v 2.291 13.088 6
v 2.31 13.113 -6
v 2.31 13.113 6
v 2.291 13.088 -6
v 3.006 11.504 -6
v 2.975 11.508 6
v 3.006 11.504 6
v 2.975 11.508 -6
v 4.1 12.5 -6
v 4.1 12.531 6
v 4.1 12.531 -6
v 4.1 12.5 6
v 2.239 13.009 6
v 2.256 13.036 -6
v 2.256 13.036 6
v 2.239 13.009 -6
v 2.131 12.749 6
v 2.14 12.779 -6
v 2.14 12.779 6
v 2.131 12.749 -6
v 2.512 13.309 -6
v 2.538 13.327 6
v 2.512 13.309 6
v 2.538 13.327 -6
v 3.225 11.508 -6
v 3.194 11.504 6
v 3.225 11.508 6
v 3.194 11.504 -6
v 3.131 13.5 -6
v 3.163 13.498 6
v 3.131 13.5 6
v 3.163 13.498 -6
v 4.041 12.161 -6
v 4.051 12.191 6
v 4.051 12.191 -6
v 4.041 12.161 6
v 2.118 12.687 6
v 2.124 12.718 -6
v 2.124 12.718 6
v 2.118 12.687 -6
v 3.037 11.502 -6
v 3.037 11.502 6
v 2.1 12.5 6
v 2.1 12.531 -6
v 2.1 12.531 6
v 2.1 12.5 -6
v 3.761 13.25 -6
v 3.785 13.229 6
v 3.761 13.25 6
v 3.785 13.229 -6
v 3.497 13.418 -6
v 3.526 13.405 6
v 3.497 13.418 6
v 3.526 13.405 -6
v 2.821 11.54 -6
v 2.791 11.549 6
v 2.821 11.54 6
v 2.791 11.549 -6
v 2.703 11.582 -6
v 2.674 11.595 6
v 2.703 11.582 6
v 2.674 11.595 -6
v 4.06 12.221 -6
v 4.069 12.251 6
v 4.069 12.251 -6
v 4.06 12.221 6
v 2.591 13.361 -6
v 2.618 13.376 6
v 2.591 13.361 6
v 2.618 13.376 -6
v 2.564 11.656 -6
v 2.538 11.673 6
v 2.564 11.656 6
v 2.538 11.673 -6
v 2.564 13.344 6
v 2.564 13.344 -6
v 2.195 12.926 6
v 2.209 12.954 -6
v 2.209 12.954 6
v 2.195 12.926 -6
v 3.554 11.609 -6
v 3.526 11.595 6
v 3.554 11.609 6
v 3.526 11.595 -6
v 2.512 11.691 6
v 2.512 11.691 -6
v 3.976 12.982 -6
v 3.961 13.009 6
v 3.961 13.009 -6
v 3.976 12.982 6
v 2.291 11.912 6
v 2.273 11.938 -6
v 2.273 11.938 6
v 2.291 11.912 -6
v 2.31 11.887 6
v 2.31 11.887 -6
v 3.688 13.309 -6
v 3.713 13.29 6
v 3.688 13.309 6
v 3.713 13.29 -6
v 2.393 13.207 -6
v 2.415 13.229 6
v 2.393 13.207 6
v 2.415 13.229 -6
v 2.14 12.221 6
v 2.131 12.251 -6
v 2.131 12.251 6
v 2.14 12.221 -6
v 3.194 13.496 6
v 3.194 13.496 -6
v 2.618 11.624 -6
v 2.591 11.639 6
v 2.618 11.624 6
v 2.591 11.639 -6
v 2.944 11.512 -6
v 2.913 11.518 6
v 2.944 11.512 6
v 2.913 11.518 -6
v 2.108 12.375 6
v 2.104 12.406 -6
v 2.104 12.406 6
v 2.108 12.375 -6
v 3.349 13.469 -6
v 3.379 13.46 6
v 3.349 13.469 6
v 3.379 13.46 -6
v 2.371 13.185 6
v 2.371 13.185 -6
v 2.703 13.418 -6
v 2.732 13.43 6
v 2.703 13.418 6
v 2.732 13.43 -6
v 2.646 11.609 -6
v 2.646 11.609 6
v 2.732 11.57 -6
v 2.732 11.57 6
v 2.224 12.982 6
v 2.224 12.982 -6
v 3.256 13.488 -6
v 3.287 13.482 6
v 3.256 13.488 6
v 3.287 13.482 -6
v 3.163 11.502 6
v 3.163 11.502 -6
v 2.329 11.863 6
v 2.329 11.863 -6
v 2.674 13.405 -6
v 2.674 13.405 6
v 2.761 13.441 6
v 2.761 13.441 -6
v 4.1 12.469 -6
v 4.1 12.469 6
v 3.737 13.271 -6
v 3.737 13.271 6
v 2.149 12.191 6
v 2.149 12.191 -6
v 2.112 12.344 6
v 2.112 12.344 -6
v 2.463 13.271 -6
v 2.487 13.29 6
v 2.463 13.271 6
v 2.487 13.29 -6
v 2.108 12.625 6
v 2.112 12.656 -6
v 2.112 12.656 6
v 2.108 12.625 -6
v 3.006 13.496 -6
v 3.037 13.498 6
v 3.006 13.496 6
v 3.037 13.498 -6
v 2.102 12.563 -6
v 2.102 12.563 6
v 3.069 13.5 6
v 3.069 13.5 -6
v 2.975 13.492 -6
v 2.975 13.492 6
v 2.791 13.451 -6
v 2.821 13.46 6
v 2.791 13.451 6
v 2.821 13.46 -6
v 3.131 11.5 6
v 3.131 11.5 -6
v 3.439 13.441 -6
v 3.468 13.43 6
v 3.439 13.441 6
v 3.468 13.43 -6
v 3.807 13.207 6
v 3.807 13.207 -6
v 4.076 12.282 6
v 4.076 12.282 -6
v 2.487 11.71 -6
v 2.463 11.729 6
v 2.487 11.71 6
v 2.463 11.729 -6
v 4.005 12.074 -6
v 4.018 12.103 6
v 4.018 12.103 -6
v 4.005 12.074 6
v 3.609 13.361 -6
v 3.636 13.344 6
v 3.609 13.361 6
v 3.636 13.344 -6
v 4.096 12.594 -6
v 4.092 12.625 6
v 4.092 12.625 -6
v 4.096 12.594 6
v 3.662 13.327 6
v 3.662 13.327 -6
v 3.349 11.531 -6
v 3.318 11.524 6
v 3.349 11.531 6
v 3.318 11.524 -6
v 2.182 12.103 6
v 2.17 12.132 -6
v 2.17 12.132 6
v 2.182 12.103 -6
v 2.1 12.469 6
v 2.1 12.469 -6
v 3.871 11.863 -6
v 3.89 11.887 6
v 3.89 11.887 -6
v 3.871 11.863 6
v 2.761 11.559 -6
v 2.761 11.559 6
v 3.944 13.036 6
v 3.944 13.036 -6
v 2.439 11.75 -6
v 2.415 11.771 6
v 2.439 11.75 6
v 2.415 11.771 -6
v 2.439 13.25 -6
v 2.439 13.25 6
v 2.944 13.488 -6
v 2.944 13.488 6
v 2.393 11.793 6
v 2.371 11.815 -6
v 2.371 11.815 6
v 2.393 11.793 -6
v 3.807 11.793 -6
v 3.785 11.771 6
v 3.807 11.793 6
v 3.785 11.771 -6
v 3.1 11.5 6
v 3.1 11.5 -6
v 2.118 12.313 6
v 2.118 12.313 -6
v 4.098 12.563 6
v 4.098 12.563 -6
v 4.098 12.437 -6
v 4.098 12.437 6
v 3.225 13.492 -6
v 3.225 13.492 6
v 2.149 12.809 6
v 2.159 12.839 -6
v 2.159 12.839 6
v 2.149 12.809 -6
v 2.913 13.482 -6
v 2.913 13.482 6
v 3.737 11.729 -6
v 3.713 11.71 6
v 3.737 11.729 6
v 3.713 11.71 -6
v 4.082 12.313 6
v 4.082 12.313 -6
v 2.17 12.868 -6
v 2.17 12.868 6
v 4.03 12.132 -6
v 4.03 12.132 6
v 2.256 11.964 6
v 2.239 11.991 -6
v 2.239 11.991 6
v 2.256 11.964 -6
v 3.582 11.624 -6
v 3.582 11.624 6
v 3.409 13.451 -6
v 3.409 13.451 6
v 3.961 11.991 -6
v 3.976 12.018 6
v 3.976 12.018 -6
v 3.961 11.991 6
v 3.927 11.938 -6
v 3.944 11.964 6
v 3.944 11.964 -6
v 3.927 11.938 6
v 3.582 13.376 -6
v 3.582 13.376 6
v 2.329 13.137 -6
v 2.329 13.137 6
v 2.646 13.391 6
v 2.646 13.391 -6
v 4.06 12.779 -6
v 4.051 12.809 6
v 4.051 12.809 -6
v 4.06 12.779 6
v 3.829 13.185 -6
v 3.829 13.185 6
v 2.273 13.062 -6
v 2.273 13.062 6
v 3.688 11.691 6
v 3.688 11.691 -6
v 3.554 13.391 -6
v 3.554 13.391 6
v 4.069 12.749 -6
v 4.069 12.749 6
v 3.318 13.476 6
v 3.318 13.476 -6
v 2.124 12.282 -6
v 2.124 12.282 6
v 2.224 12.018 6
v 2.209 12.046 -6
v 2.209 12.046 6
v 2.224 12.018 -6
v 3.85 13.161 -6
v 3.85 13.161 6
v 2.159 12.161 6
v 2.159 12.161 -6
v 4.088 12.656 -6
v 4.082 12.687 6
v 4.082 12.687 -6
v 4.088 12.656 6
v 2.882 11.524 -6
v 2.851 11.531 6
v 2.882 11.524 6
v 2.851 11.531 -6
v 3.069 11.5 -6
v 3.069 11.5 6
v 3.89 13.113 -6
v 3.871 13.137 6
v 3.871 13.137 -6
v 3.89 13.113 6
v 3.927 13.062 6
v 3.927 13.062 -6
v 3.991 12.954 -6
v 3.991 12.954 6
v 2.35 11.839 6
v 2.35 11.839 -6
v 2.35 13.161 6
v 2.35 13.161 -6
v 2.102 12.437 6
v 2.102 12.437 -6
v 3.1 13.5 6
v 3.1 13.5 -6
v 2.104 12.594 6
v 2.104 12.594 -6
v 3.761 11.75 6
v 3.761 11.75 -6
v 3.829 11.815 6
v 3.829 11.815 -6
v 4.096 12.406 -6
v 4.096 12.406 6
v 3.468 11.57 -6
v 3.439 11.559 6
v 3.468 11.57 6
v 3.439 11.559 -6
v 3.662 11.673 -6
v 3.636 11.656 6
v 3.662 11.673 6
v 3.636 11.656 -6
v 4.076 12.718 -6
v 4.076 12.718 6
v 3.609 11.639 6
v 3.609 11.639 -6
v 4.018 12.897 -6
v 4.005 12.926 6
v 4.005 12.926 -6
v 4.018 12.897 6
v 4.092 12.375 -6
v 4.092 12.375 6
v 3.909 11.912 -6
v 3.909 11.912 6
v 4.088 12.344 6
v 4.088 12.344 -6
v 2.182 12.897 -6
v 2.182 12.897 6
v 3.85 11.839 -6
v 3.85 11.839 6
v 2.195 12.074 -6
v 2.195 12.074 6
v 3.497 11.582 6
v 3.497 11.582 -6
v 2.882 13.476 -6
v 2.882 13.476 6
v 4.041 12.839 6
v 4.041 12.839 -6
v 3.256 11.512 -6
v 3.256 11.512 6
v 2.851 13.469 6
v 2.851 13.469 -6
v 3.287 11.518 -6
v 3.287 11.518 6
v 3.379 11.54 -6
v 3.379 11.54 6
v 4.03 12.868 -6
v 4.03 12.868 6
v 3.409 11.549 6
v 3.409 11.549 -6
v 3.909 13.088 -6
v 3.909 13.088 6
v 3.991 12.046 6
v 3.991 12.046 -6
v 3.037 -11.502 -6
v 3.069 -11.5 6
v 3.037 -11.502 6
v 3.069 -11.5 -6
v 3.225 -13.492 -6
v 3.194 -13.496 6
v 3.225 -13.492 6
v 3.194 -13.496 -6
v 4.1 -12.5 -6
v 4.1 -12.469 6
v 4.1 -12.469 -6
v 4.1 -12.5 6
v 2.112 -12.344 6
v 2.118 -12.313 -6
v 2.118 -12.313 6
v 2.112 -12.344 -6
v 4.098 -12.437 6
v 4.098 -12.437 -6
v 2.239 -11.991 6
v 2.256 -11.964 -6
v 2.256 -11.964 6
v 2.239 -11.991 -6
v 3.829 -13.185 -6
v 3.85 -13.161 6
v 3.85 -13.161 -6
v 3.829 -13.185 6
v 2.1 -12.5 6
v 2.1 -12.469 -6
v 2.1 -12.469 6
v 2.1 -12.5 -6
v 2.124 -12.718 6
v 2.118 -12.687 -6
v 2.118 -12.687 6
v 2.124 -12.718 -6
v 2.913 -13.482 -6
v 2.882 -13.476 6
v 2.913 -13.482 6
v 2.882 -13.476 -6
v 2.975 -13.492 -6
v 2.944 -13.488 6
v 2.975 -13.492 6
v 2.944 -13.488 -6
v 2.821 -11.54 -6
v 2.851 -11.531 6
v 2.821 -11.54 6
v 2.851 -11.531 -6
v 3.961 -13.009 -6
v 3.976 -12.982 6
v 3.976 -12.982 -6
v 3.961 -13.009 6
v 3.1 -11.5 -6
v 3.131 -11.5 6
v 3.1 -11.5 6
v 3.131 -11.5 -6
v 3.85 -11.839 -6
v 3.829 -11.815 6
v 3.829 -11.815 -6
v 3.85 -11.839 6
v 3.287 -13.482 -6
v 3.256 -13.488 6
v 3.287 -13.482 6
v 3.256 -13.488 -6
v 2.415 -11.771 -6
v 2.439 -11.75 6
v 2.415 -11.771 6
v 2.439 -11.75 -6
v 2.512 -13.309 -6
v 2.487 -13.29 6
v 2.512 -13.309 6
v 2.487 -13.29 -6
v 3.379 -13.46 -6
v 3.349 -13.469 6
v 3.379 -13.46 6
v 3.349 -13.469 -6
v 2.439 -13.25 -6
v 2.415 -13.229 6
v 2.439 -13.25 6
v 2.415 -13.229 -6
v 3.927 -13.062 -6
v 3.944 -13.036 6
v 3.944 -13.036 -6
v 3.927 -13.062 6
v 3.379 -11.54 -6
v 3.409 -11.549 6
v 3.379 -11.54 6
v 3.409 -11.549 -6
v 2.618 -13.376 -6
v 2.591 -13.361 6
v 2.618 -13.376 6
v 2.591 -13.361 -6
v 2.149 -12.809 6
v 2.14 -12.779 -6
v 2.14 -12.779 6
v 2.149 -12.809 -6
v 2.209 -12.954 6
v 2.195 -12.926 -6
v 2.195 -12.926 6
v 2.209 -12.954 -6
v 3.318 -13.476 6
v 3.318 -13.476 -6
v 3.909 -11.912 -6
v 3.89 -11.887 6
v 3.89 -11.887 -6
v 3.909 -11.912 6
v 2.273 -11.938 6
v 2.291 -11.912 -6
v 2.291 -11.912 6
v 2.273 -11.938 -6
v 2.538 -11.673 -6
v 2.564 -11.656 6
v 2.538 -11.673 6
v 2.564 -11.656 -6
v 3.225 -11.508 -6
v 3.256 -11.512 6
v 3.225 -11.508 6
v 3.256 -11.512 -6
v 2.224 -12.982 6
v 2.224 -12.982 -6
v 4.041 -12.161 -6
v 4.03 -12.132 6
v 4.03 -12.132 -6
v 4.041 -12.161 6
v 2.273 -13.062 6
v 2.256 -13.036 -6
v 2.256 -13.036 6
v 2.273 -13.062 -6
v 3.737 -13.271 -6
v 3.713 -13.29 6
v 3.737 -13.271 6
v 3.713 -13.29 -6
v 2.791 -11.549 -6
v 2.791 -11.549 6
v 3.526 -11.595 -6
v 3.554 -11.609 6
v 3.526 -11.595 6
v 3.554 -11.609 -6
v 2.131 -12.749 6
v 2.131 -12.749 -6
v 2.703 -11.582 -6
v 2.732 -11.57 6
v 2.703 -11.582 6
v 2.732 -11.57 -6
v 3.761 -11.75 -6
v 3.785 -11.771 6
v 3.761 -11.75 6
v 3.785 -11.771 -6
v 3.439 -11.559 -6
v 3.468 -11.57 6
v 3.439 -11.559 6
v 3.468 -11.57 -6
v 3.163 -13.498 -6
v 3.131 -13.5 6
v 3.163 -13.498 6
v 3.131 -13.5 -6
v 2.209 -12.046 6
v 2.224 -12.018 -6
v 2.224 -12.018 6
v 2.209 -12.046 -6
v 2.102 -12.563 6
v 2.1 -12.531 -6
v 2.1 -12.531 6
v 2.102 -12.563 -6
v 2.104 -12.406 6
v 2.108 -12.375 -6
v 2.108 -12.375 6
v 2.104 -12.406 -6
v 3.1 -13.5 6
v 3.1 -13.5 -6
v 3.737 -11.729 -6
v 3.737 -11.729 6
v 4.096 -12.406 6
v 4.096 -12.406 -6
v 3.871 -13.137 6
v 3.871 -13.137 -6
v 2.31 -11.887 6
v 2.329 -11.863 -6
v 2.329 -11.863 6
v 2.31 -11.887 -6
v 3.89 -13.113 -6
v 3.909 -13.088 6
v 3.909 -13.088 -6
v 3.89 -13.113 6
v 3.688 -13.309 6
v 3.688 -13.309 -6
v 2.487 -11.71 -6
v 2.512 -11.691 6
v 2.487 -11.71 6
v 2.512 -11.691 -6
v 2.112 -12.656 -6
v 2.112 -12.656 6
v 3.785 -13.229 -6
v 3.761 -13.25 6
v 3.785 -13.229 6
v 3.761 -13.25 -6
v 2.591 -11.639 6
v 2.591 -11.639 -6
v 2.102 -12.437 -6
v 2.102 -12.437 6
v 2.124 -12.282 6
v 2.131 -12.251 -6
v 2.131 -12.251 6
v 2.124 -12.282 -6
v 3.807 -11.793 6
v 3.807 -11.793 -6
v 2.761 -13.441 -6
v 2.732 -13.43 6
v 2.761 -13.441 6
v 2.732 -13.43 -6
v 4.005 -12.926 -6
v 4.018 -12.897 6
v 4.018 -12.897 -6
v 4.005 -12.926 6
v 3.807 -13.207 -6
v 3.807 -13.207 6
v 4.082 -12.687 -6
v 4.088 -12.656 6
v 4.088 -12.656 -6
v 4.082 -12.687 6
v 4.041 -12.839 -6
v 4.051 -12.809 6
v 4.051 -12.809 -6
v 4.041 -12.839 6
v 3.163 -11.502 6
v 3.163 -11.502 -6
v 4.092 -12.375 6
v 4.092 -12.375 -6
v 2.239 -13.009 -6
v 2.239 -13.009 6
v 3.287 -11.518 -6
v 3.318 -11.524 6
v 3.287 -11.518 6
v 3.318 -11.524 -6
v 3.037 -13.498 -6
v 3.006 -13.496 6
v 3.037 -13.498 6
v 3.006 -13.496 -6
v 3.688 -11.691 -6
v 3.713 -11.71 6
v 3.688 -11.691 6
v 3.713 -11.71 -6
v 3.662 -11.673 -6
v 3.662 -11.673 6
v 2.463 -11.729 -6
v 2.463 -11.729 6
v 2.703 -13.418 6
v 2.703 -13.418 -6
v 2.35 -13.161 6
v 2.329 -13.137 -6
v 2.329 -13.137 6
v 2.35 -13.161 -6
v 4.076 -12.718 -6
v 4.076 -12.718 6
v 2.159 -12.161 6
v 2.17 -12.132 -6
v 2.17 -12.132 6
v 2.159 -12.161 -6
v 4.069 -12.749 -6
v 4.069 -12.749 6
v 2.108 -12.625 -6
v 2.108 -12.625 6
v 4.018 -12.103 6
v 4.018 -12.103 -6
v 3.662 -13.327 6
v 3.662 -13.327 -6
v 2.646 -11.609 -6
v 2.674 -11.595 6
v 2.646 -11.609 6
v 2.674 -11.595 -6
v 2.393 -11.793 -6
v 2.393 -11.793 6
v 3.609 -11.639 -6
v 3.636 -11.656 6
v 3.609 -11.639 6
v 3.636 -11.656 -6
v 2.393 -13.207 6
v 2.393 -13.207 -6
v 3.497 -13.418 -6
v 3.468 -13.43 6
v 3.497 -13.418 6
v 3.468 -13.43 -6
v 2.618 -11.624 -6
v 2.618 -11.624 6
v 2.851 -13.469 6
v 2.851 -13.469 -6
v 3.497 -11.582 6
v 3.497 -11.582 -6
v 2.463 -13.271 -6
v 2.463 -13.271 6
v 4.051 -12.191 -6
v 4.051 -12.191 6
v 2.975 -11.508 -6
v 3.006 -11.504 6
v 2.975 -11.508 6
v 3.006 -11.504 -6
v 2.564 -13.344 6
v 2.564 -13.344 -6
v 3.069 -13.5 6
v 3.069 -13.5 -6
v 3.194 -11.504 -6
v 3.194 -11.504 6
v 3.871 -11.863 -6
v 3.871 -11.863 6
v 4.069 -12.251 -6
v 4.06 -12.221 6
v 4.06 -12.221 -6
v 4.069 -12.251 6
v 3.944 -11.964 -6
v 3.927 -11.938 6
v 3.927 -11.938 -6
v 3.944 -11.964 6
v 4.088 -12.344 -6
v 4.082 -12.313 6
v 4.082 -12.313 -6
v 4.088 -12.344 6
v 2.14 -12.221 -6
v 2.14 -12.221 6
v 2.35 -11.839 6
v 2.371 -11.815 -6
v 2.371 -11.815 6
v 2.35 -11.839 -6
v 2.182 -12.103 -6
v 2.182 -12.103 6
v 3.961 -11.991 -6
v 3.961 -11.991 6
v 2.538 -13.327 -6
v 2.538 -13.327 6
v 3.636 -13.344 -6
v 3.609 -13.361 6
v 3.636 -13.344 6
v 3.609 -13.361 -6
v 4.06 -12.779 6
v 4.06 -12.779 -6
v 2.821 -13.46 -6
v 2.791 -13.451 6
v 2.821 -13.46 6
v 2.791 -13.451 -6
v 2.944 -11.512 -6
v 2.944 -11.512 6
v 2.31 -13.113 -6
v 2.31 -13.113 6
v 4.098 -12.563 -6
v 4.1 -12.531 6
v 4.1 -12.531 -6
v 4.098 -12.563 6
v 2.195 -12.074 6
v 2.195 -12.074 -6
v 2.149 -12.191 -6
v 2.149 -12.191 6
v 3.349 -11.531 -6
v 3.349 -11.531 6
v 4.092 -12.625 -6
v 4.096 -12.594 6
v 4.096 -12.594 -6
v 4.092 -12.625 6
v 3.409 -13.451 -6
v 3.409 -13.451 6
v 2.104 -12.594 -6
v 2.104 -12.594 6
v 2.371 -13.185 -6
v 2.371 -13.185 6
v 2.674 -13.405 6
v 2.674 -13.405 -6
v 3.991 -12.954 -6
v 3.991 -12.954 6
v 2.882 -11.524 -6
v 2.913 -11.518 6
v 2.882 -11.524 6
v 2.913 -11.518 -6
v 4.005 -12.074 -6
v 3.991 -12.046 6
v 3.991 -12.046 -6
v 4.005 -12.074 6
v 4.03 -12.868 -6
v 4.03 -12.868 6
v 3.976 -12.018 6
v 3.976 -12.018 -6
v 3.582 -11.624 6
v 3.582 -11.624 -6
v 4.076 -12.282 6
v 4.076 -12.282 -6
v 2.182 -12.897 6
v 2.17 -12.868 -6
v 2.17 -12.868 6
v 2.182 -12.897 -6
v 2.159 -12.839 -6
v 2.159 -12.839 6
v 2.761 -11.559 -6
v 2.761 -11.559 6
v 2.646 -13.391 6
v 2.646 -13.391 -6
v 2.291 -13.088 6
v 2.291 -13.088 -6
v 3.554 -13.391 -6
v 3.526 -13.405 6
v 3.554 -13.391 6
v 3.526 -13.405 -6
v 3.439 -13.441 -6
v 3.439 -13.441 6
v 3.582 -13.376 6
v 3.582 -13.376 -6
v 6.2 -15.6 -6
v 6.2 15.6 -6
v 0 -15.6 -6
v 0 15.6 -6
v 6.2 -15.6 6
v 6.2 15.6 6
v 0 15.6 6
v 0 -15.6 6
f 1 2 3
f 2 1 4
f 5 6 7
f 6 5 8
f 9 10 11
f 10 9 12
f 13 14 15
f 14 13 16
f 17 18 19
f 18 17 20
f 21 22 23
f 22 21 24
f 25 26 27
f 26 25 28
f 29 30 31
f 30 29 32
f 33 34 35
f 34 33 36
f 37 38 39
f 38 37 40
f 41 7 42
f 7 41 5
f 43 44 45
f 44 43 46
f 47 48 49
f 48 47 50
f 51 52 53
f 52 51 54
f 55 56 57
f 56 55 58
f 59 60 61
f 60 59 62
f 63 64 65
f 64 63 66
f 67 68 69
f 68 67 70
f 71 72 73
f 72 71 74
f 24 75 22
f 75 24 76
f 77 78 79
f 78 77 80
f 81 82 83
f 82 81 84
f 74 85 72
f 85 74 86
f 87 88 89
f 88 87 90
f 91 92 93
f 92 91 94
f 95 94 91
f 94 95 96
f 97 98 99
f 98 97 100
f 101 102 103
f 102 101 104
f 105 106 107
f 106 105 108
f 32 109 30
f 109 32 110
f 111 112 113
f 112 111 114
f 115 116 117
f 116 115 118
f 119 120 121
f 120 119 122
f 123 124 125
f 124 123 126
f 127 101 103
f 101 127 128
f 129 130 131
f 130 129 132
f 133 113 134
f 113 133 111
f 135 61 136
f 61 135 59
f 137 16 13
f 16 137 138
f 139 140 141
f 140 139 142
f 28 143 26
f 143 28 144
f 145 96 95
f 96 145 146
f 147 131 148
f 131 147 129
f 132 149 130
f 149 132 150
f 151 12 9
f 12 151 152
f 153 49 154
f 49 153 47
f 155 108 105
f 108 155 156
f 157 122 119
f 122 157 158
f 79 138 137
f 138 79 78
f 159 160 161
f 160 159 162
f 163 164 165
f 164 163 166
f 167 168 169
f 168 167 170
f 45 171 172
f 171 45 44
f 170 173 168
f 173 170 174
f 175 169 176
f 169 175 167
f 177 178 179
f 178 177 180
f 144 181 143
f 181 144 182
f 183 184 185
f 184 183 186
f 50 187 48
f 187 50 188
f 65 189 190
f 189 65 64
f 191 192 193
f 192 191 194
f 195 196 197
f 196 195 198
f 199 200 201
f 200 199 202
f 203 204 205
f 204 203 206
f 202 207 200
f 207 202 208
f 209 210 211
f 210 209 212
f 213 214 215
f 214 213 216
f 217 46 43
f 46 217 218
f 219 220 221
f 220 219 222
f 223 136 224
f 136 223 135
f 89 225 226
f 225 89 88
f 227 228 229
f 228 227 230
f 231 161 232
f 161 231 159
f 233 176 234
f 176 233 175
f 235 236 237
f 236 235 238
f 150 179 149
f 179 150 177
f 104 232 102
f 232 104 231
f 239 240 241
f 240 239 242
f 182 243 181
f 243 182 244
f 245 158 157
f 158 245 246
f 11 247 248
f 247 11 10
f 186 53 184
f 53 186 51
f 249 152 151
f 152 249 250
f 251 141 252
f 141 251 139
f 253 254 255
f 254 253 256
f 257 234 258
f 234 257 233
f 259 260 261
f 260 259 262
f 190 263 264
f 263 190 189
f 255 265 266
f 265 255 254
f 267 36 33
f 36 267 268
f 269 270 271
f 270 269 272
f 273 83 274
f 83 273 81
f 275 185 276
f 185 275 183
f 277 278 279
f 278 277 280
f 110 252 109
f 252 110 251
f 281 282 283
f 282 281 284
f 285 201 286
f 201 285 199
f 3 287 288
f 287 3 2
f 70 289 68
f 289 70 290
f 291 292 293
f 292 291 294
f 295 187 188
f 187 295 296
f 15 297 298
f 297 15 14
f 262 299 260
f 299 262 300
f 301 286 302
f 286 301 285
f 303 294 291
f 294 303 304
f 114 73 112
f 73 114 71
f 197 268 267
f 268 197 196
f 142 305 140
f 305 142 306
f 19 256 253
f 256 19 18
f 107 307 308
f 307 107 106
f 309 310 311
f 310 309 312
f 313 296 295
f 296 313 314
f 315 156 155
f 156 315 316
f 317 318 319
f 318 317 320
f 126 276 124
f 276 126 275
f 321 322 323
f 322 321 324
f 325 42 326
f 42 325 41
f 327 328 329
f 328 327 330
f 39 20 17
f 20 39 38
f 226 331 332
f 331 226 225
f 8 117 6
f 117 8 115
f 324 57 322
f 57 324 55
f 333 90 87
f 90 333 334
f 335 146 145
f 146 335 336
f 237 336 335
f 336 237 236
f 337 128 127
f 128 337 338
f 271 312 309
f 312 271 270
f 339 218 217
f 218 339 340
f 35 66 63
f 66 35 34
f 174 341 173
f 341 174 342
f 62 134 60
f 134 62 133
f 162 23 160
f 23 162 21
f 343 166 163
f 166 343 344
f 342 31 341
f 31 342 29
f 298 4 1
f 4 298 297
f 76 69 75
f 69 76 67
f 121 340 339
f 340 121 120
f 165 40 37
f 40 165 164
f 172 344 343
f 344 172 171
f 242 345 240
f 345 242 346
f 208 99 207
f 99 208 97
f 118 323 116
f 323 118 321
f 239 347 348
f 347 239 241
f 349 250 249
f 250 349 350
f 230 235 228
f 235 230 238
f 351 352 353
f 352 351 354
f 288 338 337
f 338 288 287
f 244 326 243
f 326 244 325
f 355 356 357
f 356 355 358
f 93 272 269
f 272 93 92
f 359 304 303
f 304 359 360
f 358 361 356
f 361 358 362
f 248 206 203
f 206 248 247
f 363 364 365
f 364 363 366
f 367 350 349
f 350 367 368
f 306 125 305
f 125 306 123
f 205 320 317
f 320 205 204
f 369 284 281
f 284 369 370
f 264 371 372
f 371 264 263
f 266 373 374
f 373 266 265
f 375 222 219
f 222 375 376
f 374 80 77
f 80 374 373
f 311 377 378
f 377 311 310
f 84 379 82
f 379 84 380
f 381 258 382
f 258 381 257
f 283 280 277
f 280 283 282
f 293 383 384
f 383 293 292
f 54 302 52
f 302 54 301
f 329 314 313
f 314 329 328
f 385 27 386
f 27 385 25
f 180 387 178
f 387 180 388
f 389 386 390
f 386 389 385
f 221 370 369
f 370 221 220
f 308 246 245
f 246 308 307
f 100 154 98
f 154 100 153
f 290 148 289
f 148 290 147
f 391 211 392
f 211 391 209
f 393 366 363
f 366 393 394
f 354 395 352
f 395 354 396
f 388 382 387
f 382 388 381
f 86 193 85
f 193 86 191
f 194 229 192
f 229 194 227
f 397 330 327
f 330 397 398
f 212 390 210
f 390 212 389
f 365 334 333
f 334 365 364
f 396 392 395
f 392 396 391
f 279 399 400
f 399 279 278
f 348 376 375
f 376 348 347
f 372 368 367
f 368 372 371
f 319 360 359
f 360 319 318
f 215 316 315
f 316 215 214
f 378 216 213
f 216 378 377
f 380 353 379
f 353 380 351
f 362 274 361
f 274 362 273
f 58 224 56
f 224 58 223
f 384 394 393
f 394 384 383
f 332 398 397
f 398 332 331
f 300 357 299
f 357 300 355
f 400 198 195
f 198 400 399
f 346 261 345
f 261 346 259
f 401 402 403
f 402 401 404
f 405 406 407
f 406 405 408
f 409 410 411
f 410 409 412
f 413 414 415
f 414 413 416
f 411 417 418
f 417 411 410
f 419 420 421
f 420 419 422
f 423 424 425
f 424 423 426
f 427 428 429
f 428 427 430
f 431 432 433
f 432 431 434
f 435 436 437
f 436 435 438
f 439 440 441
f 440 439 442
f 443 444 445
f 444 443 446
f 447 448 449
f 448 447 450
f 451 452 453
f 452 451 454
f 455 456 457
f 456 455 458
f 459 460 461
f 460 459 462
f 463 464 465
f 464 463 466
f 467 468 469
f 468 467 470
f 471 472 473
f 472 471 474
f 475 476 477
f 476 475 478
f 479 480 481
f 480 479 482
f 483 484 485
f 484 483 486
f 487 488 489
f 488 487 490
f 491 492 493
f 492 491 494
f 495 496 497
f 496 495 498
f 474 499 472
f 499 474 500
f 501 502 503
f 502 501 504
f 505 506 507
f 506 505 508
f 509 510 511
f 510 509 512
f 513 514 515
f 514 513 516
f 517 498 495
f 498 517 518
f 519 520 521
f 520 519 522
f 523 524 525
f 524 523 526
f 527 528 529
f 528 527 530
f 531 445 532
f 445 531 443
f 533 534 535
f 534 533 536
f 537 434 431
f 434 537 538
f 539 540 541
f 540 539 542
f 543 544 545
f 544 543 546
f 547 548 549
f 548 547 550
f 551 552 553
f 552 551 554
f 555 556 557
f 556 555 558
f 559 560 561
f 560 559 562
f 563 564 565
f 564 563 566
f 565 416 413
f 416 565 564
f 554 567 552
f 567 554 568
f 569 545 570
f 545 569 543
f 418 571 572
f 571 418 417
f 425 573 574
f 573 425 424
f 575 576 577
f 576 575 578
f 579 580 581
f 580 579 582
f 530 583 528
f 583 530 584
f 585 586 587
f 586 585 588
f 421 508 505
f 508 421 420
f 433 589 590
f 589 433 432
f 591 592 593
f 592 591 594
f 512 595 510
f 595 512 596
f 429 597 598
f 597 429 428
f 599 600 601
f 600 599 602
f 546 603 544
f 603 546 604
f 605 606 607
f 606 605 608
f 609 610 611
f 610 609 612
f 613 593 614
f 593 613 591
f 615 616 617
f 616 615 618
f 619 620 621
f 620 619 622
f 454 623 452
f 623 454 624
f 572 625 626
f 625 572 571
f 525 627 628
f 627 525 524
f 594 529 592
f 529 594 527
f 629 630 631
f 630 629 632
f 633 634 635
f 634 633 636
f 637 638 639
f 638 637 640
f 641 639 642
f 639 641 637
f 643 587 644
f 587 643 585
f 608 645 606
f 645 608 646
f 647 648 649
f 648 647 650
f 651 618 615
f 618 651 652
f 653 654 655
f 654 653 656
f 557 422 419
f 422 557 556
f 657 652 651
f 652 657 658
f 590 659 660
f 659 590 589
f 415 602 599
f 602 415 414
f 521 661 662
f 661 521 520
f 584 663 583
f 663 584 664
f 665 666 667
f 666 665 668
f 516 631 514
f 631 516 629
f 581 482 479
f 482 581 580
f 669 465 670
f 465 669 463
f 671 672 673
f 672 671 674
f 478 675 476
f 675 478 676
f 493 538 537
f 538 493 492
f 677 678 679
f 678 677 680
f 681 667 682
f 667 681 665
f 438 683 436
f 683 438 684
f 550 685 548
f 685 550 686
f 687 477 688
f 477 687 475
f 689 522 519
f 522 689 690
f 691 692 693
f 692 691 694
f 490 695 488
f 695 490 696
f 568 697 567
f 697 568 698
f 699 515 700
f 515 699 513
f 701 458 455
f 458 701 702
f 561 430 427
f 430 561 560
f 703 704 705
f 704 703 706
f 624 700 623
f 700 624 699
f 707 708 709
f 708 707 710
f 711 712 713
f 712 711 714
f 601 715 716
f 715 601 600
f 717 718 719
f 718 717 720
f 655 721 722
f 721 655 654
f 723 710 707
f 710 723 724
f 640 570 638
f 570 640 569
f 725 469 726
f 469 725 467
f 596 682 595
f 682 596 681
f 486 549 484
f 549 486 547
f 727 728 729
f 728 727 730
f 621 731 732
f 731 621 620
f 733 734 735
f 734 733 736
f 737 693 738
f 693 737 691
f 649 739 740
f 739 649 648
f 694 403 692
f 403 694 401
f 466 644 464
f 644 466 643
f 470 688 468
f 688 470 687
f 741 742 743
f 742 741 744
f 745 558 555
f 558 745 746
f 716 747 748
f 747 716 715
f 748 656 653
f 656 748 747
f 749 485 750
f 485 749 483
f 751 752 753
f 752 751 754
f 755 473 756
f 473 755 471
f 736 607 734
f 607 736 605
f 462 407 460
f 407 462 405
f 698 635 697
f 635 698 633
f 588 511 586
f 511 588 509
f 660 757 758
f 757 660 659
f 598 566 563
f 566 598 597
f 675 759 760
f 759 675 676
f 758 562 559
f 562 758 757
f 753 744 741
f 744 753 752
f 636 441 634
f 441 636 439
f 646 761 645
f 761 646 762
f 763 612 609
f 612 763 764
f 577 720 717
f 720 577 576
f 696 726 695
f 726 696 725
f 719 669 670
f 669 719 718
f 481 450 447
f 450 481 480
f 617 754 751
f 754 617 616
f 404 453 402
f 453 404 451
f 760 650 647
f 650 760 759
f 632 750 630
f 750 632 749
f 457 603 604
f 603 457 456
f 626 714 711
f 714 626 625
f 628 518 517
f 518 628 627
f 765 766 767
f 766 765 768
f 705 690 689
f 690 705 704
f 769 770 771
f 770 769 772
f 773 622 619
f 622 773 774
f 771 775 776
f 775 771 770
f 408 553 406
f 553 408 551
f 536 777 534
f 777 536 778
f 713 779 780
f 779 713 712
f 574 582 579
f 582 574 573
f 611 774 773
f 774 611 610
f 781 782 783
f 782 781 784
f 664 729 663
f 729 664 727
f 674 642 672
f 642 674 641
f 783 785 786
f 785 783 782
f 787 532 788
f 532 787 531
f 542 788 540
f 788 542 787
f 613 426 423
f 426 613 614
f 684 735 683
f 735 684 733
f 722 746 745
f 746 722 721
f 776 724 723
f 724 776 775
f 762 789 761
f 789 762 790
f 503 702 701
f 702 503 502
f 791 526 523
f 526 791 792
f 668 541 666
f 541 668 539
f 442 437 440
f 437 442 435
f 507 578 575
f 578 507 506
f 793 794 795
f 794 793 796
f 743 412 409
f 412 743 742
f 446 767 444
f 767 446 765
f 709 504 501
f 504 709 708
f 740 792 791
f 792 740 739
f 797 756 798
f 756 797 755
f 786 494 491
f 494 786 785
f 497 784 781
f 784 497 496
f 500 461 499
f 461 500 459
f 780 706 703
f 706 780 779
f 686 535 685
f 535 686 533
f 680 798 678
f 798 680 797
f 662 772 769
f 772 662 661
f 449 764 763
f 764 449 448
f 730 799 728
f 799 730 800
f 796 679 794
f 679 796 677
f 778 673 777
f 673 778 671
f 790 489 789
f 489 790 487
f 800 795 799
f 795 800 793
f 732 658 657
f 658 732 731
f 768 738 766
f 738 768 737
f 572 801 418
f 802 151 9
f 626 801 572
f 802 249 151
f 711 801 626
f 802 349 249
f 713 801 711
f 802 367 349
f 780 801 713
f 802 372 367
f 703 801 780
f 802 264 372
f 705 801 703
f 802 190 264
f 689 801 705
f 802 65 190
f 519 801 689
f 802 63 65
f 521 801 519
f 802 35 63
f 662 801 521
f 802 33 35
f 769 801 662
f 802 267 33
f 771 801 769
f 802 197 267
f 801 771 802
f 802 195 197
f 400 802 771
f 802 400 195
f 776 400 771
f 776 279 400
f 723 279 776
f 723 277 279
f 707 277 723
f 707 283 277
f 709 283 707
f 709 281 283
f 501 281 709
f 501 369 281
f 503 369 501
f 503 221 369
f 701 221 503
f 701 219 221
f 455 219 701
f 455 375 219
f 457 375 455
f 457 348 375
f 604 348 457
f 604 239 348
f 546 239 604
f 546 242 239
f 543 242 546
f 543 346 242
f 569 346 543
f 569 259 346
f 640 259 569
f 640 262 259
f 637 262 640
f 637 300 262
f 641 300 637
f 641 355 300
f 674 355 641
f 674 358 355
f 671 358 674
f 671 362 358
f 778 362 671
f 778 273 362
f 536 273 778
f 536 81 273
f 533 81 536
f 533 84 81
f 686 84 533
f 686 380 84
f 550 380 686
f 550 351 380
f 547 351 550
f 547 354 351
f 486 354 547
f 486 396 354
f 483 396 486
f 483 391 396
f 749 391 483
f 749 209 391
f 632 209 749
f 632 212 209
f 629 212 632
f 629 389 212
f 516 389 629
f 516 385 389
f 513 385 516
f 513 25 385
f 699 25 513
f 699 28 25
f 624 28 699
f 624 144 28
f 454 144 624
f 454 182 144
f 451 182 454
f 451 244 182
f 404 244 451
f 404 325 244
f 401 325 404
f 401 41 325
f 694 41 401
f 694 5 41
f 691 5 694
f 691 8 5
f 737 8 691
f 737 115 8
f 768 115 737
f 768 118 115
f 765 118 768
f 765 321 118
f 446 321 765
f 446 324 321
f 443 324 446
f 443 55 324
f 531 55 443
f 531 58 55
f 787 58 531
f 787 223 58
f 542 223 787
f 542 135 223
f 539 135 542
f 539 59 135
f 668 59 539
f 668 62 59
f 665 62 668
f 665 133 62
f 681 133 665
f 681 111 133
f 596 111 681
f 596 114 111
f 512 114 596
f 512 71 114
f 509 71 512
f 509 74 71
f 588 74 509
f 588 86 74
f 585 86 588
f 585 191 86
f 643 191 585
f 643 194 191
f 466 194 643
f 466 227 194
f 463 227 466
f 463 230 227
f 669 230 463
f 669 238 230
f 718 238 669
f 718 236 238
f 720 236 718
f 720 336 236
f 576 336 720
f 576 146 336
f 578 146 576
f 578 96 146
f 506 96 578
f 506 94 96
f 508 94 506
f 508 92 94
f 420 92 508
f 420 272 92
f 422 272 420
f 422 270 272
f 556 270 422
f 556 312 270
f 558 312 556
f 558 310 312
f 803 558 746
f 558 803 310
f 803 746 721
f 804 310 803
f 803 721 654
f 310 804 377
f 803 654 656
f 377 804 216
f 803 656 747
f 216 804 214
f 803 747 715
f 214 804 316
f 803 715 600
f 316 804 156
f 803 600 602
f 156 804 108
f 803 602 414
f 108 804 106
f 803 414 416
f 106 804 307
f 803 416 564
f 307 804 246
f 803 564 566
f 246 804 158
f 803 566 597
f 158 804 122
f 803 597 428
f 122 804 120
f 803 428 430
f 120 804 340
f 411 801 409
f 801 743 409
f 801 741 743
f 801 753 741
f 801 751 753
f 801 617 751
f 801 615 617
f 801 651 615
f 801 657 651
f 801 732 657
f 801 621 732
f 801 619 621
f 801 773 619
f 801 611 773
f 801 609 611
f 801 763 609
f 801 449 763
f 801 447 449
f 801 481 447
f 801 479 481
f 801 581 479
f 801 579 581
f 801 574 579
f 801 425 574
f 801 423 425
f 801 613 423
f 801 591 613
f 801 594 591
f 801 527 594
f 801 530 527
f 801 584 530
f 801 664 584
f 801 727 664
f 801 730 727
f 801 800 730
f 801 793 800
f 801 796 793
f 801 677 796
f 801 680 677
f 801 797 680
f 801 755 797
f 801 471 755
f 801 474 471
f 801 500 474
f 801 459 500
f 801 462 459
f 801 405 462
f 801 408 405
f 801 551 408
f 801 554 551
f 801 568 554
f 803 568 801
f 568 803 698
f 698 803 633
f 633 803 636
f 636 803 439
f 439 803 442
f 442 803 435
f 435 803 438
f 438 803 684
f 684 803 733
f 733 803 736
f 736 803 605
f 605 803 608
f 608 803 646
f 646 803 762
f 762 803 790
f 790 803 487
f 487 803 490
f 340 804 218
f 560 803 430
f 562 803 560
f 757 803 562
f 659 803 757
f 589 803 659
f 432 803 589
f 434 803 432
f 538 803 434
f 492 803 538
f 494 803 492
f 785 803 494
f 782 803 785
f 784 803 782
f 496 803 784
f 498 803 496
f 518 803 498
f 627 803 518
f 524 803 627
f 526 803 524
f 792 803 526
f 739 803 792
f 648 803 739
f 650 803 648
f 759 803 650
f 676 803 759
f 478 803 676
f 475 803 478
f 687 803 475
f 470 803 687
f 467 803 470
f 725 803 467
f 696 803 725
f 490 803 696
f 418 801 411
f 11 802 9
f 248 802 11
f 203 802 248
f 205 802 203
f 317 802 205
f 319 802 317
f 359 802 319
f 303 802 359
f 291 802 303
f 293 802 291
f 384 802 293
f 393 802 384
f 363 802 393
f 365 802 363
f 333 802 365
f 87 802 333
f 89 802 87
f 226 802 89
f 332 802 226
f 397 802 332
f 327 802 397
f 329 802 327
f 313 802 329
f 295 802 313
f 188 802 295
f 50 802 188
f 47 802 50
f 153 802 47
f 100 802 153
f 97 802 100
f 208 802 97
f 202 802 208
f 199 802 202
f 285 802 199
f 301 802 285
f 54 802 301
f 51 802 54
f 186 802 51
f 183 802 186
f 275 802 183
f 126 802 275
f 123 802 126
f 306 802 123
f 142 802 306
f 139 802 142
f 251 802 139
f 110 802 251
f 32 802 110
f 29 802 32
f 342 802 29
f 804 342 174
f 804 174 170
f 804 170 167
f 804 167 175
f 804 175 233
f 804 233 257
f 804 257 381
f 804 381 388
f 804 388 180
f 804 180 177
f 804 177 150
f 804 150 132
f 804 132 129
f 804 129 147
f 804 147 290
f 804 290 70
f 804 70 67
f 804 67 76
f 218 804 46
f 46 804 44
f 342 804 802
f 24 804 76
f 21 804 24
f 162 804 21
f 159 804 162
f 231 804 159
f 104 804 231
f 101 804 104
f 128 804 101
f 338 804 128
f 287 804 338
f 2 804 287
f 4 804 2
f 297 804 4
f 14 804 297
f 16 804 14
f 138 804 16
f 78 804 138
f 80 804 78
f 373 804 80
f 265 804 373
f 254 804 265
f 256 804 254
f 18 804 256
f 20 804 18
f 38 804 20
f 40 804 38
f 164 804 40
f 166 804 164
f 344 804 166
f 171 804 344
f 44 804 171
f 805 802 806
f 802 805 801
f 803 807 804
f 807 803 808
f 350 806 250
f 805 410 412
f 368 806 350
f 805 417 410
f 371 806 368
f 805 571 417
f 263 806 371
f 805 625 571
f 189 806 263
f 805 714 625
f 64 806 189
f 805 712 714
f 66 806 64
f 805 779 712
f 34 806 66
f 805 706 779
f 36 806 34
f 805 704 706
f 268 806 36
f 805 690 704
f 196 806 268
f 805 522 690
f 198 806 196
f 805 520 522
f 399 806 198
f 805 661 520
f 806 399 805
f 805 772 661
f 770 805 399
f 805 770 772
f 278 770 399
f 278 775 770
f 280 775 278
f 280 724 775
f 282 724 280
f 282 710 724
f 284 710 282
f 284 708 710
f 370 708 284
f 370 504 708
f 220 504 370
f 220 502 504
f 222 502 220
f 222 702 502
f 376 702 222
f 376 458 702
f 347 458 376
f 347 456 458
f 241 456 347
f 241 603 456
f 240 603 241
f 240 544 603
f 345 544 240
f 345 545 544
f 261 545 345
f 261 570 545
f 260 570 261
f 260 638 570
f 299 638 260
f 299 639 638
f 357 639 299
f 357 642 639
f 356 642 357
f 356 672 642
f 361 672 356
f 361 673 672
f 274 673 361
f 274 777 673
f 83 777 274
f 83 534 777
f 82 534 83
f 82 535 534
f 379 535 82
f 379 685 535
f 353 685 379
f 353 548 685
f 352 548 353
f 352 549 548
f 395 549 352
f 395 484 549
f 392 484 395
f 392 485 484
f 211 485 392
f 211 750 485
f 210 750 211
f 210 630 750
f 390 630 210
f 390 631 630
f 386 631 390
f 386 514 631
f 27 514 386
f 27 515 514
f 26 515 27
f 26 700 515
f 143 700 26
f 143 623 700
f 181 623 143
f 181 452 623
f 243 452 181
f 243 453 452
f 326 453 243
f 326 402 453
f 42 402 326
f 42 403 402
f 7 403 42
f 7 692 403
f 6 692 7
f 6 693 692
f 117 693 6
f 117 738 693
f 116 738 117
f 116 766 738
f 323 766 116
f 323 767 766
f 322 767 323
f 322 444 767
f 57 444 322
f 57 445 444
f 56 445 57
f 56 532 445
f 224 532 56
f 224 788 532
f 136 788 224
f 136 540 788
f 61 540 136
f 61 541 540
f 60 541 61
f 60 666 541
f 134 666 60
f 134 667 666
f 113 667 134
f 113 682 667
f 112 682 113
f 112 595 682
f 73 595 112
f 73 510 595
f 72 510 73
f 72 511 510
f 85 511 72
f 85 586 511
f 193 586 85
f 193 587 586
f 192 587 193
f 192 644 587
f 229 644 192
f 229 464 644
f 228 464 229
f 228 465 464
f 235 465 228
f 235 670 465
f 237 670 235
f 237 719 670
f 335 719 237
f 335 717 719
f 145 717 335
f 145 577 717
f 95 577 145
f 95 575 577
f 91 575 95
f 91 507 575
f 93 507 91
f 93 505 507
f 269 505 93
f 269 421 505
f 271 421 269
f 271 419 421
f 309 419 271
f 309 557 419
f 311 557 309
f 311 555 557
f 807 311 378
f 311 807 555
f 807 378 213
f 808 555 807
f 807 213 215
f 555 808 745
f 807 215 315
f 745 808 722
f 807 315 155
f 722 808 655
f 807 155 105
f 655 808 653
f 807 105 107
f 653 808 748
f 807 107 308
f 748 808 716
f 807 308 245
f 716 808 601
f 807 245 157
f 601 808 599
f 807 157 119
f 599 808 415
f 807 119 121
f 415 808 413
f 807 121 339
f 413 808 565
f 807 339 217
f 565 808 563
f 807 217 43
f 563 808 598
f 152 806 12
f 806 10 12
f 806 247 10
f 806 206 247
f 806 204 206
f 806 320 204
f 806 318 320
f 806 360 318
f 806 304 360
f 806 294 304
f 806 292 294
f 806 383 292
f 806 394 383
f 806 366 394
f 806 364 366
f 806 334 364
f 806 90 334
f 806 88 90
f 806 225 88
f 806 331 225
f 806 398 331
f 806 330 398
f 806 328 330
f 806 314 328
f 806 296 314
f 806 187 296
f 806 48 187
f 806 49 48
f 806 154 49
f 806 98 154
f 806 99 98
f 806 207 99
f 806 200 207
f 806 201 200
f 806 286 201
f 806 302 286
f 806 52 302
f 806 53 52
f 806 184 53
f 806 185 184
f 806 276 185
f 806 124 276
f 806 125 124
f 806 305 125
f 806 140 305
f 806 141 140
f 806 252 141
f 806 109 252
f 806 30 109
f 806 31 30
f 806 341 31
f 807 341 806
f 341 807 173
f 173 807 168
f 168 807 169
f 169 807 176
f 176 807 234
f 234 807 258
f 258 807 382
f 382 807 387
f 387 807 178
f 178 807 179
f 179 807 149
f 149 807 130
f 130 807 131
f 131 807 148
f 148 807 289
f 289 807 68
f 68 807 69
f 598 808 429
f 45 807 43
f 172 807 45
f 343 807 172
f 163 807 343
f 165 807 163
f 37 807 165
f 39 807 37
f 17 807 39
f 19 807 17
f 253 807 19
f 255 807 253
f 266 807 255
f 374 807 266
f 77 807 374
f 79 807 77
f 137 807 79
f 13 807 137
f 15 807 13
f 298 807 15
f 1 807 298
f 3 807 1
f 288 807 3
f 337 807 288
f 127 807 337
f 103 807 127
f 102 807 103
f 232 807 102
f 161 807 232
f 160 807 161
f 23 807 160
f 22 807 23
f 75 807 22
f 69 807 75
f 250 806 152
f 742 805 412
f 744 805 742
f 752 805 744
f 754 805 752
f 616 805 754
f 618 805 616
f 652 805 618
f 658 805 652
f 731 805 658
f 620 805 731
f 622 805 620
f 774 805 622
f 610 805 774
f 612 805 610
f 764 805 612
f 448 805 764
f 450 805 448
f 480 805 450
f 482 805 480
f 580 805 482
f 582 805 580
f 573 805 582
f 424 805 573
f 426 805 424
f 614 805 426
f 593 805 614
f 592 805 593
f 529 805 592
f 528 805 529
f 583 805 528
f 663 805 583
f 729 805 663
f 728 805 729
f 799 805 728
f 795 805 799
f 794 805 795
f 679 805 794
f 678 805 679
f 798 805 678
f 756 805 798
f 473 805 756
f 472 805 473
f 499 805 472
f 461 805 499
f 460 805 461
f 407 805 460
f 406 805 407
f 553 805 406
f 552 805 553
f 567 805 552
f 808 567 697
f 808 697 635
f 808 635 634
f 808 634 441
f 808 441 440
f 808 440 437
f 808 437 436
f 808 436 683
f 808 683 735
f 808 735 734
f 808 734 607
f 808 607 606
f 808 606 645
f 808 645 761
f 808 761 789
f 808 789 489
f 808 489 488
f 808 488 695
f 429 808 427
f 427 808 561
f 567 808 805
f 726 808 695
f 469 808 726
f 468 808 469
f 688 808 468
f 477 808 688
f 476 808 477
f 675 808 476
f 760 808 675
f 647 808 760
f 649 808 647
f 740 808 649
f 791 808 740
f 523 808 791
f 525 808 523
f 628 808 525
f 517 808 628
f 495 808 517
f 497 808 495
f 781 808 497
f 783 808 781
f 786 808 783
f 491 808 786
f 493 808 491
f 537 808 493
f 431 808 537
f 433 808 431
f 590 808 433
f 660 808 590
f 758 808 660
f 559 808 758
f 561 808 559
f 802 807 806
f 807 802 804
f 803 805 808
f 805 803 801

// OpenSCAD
/*
Copyright Luke Wallin 2020

This file is part of Luke Wallin's 3DPrintedTrains project.

The 3DPrintedTrains project is free software: you can redistribute it and/or modify
it under the terms of the GNU General Public License as published by
the Free Software Foundation, either version 3 of the License, or
(at your option) any later version.

The 3DPrintedTrains project is distributed in the hope that it will be useful,
but WITHOUT ANY WARRANTY; without even the implied warranty of
MERCHANTABILITY or FITNESS FOR A PARTICULAR PURPOSE.  See the
GNU General Public License for more details.

You should have received a copy of the GNU General Public License
along with The 3DPrintedTrains project.  If not, see <https:www.gnu.org/licenses/>.
*/

//bogie for testing 3d printed wheels

//aiming for distance between flanges of 16.0

wheel_diameter = 12.4;

flange_distance = 16.0;

washer_width = 0.3;
wheel_base = 1.5;
wheel_flange_depth = 0.2;

width = flange_distance - 2*washer_width - 2*wheel_base - 2* wheel_flange_depth;
echo(width);

axle_spacing = 25;

length = axle_spacing+wheel_diameter/2;

height = wheel_diameter/2;

m2_hole_d = 2;
$fn=200;


rotate([0,90,0]){//print with holes vertically
difference(){
    
    translate([-width/2, -length/2]){
        cube([width,length,height]);
    }
    
    union(){
        
        translate([0,(axle_spacing)/2,height/2]){
            rotate([0,90,0]){
                cylinder(r=m2_hole_d/2,h=width*2,center=true);
            }
        }
        translate([0,-(axle_spacing)/2,height/2]){
            rotate([0,90,0]){
                cylinder(r=m2_hole_d/2,h=width*2,center=true);
            }
        }
    }
}
}
